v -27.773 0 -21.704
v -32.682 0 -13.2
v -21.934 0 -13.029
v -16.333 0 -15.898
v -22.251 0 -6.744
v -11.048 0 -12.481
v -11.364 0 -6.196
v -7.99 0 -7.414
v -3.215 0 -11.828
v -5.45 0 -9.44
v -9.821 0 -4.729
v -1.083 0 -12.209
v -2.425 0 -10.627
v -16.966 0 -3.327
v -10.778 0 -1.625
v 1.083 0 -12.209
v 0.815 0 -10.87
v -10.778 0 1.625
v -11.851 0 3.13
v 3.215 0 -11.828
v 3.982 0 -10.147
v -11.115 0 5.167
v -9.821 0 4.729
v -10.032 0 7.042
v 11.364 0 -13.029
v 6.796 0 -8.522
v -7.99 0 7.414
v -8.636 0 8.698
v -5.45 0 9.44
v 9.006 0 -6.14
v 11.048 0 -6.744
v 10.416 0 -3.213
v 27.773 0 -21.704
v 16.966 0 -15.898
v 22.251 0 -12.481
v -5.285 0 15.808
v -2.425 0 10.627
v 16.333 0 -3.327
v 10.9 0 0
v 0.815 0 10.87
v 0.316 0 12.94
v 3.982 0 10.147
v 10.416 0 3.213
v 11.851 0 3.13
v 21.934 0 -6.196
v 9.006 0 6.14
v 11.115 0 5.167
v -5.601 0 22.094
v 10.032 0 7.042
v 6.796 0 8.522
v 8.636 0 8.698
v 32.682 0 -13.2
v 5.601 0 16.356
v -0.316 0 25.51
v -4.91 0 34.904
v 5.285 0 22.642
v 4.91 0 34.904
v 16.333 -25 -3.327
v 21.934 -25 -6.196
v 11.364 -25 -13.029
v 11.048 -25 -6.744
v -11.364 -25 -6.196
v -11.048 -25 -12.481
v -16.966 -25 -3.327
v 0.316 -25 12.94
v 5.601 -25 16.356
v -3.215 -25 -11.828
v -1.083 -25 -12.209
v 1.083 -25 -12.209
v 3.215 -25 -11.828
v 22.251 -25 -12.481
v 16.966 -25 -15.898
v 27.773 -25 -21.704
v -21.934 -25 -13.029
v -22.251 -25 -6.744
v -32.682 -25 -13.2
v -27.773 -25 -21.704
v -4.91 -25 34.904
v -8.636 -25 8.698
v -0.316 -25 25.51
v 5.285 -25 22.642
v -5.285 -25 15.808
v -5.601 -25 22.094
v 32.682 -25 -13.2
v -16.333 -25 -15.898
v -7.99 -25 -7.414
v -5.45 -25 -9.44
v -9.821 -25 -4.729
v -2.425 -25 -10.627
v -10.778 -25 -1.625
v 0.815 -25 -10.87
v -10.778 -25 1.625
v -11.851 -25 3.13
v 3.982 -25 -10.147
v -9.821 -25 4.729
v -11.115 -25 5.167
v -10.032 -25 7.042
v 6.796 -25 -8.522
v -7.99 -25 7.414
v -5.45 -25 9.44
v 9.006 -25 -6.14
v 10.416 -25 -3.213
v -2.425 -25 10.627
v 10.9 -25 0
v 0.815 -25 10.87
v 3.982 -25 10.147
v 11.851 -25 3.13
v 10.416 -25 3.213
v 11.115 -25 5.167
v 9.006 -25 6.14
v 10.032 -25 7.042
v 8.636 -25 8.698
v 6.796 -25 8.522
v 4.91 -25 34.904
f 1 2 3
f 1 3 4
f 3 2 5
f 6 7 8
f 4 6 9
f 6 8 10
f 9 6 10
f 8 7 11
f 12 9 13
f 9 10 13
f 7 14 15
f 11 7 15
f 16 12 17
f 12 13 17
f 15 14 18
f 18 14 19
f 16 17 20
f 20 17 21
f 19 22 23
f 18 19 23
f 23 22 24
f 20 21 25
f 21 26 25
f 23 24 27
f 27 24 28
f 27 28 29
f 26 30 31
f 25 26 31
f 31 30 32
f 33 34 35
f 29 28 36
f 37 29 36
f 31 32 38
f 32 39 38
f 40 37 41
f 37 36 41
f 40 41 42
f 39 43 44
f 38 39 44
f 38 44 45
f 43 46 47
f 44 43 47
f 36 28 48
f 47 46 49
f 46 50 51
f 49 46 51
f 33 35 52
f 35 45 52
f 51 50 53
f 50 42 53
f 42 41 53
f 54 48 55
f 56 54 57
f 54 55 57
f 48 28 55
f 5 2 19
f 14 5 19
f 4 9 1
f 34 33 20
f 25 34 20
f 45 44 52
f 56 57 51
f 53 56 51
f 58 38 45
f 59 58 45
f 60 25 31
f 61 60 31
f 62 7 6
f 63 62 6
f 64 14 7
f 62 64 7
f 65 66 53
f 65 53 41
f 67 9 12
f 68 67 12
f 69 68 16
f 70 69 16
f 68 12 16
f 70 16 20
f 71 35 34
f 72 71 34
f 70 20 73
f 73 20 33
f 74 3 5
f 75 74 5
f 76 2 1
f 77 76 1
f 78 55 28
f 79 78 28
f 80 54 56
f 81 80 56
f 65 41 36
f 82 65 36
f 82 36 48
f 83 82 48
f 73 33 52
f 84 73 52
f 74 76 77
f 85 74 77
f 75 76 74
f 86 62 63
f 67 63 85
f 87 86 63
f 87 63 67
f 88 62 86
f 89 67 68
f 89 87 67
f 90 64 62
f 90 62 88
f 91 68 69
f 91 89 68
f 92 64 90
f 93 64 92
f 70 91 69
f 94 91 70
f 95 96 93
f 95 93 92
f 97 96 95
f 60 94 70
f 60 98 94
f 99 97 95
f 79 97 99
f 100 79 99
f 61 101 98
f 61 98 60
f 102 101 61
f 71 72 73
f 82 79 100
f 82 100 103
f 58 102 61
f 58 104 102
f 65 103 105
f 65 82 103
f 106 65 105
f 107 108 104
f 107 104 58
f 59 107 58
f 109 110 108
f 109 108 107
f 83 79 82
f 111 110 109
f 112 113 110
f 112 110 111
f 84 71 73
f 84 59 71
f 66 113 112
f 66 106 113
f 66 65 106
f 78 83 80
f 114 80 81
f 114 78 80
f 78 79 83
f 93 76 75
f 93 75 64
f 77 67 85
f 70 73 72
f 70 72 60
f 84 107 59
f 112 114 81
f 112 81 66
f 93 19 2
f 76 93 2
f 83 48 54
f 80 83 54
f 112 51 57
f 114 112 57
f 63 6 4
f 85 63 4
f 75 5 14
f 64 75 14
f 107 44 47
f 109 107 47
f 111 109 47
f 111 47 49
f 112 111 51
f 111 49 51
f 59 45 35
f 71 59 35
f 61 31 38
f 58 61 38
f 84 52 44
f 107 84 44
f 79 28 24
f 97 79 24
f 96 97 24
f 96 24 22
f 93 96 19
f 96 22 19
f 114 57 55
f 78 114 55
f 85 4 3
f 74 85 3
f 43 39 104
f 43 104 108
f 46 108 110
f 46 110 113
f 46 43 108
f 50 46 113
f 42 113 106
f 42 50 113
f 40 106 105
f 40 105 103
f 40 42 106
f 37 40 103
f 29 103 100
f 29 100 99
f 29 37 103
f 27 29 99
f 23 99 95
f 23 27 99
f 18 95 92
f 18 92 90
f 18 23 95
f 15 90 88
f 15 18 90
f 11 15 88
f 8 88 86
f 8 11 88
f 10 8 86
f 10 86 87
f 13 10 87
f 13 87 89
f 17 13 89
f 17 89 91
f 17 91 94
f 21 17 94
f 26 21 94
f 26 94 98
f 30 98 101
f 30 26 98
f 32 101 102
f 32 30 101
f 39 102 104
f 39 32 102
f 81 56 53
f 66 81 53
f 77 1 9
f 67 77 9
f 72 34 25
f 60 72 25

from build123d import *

# Parameters (mm, degrees)
F0_R     = 10.9
F1_DEPTH = 25


with BuildPart() as f1:
    # F0 (on Front) → F1 (new body)
    with BuildSketch(Plane.XZ):
        with BuildLine():
            Line((-4.909692, 34.903756), (-8.6357, 8.698229))
            ThreePointArc((-8.6357, 8.698229), (-10.61489, 6.128509), (-11.850737, 3.129621))
            Line((-11.850737, 3.129621), (-32.682386, -13.19996))
            Line((-32.682386, -13.19996), (-30.22754, -17.451878))
            Line((-30.22754, -17.451878), (-27.772694, -21.703796))
            Line((-27.772694, -21.703796), (-3.215038, -11.82785))
            ThreePointArc((-3.215038, -11.82785), (0, -12.257019), (3.215038, -11.82785))
            Line((3.215038, -11.82785), (27.772694, -21.703796))
            Line((27.772694, -21.703796), (30.22754, -17.451878))
            Line((30.22754, -17.451878), (32.682386, -13.19996))
            Line((32.682386, -13.19996), (11.850737, 3.129621))
            ThreePointArc((11.850737, 3.129621), (10.61489, 6.128509), (8.6357, 8.698229))
            Line((8.6357, 8.698229), (4.909692, 34.903756))
            Line((4.909692, 34.903756), (0, 34.903756))
            Line((0, 34.903756), (-4.909692, 34.903756))
        make_face()
        Polygon((-16.33297, -15.897677), (-21.934277, -13.029107), (-22.250676, -6.743948), (-16.965768, -3.327359), (-11.364461, -6.195929), (-11.048062, -12.481088), align=None, mode=Mode.SUBTRACT)
        Polygon((21.934277, -6.195929), (22.250676, -12.481088), (16.965768, -15.897677), (11.364461, -13.029107), (11.048062, -6.743948), (16.33297, -3.327359), align=None, mode=Mode.SUBTRACT)
        Circle(F0_R, mode=Mode.SUBTRACT)
        Polygon((5.601307, 16.356466), (0.316399, 12.939876), (-5.284908, 15.808446), (-5.601307, 22.093605), (-0.316399, 25.510195), (5.284908, 22.641625), align=None, mode=Mode.SUBTRACT)
    extrude(amount=F1_DEPTH)


solid = f1.part
